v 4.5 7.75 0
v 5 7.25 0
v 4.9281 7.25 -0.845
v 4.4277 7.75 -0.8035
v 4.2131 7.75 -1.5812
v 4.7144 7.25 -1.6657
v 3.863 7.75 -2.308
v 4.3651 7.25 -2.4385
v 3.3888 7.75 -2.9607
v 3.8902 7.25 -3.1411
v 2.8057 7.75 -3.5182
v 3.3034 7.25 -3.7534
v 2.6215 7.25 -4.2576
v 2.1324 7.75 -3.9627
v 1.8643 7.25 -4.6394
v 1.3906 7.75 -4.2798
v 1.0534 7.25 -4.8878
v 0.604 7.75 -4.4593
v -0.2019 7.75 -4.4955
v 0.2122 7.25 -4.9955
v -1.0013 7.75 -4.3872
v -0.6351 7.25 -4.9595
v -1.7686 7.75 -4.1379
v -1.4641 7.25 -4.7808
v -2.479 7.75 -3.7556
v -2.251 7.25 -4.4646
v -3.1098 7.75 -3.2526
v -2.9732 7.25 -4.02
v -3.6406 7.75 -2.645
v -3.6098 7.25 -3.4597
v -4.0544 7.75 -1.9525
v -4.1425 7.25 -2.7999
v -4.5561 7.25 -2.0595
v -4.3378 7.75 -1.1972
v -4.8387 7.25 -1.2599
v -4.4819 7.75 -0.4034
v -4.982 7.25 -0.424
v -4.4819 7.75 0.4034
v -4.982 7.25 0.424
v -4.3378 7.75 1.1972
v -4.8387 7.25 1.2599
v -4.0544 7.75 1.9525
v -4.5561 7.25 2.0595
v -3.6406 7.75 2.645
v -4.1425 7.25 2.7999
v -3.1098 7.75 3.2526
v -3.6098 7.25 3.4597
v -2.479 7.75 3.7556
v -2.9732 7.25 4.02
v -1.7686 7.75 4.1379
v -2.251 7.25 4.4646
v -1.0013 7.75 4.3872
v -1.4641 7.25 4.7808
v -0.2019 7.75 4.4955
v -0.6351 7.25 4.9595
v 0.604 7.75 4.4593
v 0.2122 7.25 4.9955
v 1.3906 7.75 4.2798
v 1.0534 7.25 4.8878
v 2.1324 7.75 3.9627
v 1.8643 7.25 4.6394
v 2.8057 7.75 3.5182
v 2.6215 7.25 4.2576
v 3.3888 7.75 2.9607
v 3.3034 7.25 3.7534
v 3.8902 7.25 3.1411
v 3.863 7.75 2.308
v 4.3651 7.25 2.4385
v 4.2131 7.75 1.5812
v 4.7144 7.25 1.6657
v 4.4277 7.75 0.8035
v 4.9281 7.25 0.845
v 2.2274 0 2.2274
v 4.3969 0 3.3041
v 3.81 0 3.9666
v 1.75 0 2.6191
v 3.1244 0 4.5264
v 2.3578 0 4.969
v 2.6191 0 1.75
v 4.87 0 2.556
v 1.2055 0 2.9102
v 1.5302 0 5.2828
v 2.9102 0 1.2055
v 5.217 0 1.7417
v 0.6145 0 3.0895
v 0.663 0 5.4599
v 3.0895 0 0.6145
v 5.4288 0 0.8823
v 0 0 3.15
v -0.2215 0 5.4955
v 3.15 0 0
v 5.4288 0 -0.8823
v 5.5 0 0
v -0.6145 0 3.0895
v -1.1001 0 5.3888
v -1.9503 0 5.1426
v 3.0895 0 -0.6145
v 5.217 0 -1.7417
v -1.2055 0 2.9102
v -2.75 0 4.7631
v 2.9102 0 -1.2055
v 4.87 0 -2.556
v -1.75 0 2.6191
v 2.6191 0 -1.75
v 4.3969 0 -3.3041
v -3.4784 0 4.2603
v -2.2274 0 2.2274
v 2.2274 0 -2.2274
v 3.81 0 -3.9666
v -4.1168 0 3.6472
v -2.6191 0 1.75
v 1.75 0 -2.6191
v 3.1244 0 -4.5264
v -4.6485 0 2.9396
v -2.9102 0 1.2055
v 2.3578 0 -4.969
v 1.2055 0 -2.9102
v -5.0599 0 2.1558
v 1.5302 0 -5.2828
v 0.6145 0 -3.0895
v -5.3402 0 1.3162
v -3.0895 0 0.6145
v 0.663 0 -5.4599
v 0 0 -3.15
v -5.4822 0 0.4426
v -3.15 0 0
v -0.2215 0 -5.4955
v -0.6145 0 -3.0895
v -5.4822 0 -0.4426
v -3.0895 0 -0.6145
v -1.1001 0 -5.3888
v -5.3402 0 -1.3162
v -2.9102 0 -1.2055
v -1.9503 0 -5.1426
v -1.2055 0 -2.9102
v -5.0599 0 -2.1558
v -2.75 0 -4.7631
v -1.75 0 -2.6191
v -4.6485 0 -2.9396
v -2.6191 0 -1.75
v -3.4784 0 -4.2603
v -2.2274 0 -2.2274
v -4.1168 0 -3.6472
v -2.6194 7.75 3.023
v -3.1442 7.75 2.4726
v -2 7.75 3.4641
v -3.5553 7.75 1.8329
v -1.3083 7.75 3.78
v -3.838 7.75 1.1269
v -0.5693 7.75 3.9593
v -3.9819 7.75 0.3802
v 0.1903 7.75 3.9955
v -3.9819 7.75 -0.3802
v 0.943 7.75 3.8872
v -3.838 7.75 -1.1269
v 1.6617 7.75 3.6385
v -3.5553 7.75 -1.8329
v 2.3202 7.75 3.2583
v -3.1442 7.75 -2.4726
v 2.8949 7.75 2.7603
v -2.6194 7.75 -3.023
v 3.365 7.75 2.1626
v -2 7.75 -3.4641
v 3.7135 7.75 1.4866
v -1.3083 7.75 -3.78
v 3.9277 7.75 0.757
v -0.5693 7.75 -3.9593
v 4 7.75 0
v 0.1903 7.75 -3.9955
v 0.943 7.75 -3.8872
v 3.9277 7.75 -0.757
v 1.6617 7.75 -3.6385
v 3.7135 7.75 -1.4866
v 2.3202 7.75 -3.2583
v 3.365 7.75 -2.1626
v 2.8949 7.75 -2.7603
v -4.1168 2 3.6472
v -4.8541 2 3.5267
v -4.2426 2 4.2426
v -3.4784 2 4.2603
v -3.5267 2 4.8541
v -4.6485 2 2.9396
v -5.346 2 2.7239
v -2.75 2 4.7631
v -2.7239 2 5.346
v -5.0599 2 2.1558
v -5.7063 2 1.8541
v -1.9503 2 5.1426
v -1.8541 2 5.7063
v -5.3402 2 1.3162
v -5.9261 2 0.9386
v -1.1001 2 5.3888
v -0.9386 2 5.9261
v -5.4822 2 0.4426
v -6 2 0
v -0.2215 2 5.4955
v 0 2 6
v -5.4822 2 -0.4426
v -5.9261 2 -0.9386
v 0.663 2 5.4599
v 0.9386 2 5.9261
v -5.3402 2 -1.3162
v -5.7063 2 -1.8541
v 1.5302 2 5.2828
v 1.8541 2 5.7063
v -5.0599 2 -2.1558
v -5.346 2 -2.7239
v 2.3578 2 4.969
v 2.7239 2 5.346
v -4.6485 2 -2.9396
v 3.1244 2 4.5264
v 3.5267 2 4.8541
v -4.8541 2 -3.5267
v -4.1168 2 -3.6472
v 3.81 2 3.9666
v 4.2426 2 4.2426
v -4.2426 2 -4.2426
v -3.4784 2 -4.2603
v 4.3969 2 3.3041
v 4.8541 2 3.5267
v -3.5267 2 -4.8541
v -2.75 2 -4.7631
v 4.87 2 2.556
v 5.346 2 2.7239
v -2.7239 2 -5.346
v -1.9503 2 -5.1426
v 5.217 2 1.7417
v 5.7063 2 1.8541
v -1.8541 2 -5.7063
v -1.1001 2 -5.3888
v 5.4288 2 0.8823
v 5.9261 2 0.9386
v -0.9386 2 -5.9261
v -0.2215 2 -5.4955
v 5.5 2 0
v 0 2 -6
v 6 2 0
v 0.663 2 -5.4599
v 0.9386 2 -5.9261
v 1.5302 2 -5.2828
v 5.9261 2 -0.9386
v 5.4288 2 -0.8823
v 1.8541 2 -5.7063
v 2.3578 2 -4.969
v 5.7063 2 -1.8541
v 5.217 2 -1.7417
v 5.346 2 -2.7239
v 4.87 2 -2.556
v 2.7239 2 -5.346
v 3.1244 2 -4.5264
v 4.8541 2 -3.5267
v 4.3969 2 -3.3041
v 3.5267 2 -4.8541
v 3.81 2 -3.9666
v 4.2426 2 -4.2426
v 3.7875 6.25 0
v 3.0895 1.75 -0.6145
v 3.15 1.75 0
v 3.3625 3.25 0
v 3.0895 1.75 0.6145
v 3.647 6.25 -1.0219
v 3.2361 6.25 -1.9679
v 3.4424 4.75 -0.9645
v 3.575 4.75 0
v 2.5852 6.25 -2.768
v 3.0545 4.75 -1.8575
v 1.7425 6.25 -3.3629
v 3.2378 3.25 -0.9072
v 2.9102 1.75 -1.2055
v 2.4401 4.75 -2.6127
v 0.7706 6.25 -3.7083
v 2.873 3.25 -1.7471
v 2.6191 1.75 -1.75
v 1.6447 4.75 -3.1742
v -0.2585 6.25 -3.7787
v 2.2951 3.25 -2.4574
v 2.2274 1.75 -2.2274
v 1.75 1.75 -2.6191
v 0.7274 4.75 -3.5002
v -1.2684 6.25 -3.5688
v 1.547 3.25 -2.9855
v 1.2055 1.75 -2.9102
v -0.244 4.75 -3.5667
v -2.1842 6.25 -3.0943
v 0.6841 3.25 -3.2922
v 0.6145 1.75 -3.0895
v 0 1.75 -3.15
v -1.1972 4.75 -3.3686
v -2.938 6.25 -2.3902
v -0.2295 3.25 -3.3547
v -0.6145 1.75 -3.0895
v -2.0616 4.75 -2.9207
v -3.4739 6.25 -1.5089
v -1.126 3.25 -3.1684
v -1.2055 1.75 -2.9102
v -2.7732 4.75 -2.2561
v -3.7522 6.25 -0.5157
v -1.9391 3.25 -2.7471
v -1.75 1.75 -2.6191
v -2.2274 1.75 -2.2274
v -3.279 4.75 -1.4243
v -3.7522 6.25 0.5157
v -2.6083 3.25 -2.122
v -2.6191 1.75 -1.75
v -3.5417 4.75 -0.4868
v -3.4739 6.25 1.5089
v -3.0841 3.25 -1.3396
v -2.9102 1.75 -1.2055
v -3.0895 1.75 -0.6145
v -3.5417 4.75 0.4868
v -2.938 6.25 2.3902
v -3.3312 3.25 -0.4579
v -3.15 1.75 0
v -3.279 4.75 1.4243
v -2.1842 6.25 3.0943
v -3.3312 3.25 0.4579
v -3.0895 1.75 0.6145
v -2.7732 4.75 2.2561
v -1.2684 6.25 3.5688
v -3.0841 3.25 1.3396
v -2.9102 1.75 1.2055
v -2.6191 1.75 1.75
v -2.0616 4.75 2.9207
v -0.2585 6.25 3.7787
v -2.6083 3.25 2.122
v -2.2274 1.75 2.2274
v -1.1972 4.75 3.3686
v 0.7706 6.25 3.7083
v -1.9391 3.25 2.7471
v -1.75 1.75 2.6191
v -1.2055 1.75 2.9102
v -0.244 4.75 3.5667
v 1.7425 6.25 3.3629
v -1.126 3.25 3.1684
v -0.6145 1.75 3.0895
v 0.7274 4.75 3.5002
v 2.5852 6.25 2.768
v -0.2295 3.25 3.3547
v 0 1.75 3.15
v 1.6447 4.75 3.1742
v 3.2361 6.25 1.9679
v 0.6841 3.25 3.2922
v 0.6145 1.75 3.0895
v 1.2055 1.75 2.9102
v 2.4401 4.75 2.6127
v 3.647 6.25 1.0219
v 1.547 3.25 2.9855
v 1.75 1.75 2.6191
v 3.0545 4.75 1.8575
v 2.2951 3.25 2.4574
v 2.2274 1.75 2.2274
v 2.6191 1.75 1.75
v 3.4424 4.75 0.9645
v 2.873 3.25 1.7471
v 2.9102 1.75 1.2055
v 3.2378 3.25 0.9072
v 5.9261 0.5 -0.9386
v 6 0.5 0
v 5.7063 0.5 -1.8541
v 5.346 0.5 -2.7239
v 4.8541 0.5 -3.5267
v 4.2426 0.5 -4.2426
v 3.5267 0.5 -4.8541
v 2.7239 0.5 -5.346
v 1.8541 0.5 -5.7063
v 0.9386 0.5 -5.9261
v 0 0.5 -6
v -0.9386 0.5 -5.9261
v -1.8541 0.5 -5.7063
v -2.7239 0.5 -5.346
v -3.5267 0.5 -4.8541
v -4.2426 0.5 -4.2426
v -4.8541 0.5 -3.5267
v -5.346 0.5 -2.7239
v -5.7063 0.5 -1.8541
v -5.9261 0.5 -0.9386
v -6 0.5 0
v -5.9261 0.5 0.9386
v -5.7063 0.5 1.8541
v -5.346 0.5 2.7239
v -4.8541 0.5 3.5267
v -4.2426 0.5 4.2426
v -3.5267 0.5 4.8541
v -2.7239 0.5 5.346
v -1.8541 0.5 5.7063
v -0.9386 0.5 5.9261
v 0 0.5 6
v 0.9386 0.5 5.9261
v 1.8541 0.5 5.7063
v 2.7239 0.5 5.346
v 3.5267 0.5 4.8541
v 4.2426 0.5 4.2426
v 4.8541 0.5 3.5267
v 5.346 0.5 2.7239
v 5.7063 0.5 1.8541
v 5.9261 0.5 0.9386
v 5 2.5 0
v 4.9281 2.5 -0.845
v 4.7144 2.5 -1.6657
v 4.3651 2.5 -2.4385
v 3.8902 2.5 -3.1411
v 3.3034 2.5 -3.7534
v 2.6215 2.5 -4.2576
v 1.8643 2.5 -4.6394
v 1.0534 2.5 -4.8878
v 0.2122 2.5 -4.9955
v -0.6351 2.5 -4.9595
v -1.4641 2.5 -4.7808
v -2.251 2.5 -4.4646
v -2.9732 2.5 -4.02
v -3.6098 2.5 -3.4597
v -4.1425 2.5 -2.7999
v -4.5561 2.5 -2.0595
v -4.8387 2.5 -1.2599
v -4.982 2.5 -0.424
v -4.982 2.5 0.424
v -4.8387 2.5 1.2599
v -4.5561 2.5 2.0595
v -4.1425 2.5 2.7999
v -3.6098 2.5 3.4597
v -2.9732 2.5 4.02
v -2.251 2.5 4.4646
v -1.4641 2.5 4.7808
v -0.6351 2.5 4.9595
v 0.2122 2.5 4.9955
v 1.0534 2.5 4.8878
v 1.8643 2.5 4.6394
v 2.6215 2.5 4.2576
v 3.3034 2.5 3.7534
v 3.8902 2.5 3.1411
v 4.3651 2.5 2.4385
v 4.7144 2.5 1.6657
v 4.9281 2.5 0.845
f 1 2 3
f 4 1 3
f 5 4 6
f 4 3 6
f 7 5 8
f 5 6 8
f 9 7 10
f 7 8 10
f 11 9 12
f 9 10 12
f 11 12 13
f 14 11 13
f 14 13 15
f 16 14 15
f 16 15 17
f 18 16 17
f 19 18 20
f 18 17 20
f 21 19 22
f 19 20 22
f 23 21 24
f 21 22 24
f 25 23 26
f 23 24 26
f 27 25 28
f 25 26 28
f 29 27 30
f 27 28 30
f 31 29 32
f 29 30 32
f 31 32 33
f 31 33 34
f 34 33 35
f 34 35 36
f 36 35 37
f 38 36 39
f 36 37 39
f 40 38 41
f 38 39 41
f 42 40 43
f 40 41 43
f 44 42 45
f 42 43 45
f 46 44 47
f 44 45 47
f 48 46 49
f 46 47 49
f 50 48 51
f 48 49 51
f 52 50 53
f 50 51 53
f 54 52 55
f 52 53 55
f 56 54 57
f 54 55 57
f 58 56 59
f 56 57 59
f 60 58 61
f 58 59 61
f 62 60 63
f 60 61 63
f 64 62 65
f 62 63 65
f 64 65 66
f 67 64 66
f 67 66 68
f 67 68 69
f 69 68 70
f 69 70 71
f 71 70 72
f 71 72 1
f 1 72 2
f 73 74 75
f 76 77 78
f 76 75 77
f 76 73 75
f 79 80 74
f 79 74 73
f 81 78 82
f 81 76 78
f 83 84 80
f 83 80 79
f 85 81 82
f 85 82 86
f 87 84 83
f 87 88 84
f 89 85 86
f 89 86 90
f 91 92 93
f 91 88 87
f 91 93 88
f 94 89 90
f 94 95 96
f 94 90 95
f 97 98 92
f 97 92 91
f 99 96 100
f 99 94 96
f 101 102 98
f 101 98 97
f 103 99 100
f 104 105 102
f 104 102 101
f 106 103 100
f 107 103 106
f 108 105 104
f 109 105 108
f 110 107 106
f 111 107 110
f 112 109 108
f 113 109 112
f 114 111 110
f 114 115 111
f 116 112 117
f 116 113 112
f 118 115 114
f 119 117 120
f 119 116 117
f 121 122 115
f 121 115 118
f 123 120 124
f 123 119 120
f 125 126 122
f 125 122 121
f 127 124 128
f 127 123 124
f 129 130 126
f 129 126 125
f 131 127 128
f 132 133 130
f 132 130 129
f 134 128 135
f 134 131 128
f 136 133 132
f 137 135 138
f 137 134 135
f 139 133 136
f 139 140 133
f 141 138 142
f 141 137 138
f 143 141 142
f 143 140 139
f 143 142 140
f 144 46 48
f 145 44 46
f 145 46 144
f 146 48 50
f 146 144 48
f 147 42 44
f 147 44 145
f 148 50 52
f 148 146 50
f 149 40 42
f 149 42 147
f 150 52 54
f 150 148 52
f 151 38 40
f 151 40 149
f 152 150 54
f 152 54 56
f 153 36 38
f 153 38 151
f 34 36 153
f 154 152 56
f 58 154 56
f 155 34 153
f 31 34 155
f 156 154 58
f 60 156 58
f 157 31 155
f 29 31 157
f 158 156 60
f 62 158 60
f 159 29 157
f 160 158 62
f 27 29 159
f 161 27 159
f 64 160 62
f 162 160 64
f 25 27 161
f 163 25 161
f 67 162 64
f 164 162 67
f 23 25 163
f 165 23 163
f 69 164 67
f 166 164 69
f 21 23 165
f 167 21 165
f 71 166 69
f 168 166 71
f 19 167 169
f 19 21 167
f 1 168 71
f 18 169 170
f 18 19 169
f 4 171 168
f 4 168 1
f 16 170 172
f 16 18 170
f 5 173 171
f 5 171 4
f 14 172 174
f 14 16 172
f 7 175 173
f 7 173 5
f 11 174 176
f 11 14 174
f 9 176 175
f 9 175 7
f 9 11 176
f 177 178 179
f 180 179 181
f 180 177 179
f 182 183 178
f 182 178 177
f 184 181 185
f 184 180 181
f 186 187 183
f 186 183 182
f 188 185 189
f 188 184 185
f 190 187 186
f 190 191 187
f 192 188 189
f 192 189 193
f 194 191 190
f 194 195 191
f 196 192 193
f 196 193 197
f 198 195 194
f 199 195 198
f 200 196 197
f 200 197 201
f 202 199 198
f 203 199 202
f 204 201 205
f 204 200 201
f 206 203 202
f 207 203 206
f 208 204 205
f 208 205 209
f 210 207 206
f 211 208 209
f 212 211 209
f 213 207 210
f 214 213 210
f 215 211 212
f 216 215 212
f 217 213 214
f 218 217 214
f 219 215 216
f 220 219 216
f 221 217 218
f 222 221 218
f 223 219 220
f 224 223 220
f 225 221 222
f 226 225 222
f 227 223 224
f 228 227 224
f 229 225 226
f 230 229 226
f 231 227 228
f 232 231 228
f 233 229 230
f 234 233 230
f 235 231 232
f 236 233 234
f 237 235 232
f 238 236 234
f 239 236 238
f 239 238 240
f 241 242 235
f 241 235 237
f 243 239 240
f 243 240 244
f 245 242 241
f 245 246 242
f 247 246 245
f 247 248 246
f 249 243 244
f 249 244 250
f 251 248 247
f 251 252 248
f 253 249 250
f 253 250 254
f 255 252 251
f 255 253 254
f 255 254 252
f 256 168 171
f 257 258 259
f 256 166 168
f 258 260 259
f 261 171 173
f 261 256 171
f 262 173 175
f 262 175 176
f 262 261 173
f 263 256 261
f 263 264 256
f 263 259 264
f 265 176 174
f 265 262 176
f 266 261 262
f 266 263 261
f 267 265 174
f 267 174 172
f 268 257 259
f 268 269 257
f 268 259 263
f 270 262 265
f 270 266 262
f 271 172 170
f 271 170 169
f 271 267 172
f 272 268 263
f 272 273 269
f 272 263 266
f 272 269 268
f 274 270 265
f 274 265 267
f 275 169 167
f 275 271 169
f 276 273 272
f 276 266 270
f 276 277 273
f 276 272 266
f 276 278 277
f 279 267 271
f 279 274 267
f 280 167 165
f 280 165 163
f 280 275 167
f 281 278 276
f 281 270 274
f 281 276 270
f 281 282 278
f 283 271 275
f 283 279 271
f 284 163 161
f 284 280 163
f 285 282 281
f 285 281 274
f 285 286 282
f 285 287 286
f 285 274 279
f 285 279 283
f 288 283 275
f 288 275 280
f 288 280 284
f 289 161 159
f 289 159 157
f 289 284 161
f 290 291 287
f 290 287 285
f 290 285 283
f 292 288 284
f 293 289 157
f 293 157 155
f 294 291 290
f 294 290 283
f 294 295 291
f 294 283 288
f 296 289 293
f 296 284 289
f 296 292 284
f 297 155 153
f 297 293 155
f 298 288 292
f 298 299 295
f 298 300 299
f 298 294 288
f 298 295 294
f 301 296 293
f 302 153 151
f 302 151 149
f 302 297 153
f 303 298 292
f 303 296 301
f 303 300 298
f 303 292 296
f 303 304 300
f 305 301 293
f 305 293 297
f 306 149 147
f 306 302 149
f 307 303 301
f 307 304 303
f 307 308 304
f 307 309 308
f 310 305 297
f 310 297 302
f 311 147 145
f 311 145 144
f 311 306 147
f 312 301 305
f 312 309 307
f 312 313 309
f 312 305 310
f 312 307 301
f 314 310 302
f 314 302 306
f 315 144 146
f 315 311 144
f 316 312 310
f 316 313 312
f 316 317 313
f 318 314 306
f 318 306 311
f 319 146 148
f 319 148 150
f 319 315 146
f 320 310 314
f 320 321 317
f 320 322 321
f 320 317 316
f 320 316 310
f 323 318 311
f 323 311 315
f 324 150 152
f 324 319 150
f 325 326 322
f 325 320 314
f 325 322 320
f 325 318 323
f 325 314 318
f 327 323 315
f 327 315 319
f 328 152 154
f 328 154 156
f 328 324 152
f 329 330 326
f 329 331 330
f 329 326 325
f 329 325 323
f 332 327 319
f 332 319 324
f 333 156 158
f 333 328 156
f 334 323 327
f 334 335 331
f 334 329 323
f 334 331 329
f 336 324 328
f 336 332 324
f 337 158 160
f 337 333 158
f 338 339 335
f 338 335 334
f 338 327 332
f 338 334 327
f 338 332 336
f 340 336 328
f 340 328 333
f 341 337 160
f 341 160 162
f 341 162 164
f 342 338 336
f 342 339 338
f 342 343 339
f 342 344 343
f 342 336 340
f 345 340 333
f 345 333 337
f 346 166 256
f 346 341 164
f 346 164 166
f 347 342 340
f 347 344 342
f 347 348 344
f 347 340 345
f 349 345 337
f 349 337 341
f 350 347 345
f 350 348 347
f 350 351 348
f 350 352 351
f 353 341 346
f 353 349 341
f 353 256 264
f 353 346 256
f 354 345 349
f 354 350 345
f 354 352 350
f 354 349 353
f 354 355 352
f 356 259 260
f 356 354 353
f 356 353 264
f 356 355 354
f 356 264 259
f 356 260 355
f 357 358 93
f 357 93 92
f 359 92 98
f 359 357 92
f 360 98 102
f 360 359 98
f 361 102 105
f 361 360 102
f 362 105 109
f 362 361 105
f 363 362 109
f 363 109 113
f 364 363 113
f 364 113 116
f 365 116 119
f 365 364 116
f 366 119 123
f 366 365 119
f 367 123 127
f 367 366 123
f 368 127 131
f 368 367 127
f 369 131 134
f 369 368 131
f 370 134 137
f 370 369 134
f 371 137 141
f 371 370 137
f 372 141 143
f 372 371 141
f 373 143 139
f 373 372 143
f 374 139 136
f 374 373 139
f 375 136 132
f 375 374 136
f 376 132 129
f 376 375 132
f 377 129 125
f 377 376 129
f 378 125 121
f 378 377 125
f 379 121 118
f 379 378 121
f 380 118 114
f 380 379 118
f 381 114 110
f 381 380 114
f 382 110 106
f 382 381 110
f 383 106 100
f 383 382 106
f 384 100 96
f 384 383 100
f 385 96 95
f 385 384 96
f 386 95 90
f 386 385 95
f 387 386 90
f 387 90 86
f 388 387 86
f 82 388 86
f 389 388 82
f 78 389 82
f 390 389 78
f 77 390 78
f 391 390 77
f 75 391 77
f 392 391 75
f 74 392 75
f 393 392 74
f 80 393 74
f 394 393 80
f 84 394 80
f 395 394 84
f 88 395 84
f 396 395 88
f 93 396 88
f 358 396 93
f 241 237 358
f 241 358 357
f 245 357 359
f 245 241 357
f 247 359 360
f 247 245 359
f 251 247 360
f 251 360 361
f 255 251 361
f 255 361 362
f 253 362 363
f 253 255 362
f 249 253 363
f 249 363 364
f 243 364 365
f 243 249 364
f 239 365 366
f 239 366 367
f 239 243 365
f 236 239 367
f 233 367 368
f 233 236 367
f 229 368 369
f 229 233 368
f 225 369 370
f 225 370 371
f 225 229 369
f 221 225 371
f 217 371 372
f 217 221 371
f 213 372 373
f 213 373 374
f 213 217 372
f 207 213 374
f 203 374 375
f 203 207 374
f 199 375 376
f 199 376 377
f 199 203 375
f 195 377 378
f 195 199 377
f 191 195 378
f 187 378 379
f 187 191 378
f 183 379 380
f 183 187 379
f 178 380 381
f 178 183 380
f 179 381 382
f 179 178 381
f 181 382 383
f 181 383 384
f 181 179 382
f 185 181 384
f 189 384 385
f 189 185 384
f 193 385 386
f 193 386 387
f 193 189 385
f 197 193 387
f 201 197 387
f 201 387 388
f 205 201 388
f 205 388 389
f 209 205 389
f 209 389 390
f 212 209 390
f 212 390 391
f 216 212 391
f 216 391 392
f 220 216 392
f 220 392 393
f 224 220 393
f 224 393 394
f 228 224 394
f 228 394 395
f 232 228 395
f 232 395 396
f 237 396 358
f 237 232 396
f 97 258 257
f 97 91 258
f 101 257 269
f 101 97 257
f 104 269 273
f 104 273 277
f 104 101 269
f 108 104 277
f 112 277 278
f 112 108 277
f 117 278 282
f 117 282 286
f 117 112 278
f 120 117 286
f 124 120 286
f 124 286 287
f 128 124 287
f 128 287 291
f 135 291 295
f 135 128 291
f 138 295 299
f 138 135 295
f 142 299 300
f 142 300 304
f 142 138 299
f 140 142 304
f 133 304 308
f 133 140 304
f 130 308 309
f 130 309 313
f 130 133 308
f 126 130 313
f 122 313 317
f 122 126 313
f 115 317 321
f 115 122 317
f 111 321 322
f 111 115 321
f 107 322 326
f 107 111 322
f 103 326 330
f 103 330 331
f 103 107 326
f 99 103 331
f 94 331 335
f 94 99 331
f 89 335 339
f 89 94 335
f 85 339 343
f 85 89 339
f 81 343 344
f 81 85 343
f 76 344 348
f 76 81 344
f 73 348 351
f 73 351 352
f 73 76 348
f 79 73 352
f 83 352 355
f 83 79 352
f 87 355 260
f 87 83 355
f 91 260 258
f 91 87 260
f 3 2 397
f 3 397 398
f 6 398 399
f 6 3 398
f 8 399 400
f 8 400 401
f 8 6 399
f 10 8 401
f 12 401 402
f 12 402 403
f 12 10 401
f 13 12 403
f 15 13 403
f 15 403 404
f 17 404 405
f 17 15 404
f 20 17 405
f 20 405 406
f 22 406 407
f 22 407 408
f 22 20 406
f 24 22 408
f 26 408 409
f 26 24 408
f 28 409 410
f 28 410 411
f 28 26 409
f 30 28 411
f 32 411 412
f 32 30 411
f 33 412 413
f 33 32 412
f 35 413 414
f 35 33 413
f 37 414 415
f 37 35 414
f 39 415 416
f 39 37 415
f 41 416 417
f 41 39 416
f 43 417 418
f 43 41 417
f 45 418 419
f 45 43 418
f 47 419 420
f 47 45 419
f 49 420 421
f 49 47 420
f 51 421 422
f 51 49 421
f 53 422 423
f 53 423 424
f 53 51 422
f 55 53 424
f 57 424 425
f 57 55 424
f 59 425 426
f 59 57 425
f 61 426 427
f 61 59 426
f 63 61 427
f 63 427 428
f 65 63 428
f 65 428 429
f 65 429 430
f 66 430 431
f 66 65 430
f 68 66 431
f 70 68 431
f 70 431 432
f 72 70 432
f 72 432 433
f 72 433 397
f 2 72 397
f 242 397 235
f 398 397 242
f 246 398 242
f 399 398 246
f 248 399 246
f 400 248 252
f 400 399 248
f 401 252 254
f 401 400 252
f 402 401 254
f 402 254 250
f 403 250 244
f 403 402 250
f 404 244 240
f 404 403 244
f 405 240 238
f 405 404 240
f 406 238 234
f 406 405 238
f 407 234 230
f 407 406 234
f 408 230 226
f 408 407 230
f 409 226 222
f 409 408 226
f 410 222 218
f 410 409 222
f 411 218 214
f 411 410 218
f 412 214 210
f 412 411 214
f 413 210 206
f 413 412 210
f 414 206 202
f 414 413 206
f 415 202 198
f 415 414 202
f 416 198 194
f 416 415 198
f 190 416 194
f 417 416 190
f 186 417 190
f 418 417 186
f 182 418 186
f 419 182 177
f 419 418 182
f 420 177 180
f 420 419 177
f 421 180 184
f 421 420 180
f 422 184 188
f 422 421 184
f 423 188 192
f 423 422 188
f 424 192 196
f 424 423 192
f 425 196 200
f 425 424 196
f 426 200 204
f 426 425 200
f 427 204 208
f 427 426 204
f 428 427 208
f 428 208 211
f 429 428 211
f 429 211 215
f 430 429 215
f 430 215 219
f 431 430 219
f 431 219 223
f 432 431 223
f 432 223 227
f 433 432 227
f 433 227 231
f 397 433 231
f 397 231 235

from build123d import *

# Parameters (mm, degrees)
CHANFREIN1_SIZE = 0.5
CHANFREIN2_SIZE = 0.5


with BuildPart() as part:
    # Sketch1 → Revolve1 (revolve)
    with BuildSketch(Plane.XY):
        Polygon((3.15, 0), (6, 0), (6, 2), (5.5, 2), (5, 2.5), (5, 7.75), (4, 7.75), (3.15, 1.75), align=None)
    revolve(axis=Axis((0, -36.960268038, 0), (0, 1, 0)))

    # Chanfrein1
    chanfrein1_edges = [part.edges().sort_by_distance(p)[0] for p in [
        (-6, 0, 0),
    ]]
    chamfer(chanfrein1_edges, length=CHANFREIN1_SIZE)

    # Chanfrein2
    chanfrein2_edges = [part.edges().sort_by_distance(p)[0] for p in [
        (-5, 7.75, 0),
    ]]
    chamfer(chanfrein2_edges, length=CHANFREIN2_SIZE)


solid = part.part
